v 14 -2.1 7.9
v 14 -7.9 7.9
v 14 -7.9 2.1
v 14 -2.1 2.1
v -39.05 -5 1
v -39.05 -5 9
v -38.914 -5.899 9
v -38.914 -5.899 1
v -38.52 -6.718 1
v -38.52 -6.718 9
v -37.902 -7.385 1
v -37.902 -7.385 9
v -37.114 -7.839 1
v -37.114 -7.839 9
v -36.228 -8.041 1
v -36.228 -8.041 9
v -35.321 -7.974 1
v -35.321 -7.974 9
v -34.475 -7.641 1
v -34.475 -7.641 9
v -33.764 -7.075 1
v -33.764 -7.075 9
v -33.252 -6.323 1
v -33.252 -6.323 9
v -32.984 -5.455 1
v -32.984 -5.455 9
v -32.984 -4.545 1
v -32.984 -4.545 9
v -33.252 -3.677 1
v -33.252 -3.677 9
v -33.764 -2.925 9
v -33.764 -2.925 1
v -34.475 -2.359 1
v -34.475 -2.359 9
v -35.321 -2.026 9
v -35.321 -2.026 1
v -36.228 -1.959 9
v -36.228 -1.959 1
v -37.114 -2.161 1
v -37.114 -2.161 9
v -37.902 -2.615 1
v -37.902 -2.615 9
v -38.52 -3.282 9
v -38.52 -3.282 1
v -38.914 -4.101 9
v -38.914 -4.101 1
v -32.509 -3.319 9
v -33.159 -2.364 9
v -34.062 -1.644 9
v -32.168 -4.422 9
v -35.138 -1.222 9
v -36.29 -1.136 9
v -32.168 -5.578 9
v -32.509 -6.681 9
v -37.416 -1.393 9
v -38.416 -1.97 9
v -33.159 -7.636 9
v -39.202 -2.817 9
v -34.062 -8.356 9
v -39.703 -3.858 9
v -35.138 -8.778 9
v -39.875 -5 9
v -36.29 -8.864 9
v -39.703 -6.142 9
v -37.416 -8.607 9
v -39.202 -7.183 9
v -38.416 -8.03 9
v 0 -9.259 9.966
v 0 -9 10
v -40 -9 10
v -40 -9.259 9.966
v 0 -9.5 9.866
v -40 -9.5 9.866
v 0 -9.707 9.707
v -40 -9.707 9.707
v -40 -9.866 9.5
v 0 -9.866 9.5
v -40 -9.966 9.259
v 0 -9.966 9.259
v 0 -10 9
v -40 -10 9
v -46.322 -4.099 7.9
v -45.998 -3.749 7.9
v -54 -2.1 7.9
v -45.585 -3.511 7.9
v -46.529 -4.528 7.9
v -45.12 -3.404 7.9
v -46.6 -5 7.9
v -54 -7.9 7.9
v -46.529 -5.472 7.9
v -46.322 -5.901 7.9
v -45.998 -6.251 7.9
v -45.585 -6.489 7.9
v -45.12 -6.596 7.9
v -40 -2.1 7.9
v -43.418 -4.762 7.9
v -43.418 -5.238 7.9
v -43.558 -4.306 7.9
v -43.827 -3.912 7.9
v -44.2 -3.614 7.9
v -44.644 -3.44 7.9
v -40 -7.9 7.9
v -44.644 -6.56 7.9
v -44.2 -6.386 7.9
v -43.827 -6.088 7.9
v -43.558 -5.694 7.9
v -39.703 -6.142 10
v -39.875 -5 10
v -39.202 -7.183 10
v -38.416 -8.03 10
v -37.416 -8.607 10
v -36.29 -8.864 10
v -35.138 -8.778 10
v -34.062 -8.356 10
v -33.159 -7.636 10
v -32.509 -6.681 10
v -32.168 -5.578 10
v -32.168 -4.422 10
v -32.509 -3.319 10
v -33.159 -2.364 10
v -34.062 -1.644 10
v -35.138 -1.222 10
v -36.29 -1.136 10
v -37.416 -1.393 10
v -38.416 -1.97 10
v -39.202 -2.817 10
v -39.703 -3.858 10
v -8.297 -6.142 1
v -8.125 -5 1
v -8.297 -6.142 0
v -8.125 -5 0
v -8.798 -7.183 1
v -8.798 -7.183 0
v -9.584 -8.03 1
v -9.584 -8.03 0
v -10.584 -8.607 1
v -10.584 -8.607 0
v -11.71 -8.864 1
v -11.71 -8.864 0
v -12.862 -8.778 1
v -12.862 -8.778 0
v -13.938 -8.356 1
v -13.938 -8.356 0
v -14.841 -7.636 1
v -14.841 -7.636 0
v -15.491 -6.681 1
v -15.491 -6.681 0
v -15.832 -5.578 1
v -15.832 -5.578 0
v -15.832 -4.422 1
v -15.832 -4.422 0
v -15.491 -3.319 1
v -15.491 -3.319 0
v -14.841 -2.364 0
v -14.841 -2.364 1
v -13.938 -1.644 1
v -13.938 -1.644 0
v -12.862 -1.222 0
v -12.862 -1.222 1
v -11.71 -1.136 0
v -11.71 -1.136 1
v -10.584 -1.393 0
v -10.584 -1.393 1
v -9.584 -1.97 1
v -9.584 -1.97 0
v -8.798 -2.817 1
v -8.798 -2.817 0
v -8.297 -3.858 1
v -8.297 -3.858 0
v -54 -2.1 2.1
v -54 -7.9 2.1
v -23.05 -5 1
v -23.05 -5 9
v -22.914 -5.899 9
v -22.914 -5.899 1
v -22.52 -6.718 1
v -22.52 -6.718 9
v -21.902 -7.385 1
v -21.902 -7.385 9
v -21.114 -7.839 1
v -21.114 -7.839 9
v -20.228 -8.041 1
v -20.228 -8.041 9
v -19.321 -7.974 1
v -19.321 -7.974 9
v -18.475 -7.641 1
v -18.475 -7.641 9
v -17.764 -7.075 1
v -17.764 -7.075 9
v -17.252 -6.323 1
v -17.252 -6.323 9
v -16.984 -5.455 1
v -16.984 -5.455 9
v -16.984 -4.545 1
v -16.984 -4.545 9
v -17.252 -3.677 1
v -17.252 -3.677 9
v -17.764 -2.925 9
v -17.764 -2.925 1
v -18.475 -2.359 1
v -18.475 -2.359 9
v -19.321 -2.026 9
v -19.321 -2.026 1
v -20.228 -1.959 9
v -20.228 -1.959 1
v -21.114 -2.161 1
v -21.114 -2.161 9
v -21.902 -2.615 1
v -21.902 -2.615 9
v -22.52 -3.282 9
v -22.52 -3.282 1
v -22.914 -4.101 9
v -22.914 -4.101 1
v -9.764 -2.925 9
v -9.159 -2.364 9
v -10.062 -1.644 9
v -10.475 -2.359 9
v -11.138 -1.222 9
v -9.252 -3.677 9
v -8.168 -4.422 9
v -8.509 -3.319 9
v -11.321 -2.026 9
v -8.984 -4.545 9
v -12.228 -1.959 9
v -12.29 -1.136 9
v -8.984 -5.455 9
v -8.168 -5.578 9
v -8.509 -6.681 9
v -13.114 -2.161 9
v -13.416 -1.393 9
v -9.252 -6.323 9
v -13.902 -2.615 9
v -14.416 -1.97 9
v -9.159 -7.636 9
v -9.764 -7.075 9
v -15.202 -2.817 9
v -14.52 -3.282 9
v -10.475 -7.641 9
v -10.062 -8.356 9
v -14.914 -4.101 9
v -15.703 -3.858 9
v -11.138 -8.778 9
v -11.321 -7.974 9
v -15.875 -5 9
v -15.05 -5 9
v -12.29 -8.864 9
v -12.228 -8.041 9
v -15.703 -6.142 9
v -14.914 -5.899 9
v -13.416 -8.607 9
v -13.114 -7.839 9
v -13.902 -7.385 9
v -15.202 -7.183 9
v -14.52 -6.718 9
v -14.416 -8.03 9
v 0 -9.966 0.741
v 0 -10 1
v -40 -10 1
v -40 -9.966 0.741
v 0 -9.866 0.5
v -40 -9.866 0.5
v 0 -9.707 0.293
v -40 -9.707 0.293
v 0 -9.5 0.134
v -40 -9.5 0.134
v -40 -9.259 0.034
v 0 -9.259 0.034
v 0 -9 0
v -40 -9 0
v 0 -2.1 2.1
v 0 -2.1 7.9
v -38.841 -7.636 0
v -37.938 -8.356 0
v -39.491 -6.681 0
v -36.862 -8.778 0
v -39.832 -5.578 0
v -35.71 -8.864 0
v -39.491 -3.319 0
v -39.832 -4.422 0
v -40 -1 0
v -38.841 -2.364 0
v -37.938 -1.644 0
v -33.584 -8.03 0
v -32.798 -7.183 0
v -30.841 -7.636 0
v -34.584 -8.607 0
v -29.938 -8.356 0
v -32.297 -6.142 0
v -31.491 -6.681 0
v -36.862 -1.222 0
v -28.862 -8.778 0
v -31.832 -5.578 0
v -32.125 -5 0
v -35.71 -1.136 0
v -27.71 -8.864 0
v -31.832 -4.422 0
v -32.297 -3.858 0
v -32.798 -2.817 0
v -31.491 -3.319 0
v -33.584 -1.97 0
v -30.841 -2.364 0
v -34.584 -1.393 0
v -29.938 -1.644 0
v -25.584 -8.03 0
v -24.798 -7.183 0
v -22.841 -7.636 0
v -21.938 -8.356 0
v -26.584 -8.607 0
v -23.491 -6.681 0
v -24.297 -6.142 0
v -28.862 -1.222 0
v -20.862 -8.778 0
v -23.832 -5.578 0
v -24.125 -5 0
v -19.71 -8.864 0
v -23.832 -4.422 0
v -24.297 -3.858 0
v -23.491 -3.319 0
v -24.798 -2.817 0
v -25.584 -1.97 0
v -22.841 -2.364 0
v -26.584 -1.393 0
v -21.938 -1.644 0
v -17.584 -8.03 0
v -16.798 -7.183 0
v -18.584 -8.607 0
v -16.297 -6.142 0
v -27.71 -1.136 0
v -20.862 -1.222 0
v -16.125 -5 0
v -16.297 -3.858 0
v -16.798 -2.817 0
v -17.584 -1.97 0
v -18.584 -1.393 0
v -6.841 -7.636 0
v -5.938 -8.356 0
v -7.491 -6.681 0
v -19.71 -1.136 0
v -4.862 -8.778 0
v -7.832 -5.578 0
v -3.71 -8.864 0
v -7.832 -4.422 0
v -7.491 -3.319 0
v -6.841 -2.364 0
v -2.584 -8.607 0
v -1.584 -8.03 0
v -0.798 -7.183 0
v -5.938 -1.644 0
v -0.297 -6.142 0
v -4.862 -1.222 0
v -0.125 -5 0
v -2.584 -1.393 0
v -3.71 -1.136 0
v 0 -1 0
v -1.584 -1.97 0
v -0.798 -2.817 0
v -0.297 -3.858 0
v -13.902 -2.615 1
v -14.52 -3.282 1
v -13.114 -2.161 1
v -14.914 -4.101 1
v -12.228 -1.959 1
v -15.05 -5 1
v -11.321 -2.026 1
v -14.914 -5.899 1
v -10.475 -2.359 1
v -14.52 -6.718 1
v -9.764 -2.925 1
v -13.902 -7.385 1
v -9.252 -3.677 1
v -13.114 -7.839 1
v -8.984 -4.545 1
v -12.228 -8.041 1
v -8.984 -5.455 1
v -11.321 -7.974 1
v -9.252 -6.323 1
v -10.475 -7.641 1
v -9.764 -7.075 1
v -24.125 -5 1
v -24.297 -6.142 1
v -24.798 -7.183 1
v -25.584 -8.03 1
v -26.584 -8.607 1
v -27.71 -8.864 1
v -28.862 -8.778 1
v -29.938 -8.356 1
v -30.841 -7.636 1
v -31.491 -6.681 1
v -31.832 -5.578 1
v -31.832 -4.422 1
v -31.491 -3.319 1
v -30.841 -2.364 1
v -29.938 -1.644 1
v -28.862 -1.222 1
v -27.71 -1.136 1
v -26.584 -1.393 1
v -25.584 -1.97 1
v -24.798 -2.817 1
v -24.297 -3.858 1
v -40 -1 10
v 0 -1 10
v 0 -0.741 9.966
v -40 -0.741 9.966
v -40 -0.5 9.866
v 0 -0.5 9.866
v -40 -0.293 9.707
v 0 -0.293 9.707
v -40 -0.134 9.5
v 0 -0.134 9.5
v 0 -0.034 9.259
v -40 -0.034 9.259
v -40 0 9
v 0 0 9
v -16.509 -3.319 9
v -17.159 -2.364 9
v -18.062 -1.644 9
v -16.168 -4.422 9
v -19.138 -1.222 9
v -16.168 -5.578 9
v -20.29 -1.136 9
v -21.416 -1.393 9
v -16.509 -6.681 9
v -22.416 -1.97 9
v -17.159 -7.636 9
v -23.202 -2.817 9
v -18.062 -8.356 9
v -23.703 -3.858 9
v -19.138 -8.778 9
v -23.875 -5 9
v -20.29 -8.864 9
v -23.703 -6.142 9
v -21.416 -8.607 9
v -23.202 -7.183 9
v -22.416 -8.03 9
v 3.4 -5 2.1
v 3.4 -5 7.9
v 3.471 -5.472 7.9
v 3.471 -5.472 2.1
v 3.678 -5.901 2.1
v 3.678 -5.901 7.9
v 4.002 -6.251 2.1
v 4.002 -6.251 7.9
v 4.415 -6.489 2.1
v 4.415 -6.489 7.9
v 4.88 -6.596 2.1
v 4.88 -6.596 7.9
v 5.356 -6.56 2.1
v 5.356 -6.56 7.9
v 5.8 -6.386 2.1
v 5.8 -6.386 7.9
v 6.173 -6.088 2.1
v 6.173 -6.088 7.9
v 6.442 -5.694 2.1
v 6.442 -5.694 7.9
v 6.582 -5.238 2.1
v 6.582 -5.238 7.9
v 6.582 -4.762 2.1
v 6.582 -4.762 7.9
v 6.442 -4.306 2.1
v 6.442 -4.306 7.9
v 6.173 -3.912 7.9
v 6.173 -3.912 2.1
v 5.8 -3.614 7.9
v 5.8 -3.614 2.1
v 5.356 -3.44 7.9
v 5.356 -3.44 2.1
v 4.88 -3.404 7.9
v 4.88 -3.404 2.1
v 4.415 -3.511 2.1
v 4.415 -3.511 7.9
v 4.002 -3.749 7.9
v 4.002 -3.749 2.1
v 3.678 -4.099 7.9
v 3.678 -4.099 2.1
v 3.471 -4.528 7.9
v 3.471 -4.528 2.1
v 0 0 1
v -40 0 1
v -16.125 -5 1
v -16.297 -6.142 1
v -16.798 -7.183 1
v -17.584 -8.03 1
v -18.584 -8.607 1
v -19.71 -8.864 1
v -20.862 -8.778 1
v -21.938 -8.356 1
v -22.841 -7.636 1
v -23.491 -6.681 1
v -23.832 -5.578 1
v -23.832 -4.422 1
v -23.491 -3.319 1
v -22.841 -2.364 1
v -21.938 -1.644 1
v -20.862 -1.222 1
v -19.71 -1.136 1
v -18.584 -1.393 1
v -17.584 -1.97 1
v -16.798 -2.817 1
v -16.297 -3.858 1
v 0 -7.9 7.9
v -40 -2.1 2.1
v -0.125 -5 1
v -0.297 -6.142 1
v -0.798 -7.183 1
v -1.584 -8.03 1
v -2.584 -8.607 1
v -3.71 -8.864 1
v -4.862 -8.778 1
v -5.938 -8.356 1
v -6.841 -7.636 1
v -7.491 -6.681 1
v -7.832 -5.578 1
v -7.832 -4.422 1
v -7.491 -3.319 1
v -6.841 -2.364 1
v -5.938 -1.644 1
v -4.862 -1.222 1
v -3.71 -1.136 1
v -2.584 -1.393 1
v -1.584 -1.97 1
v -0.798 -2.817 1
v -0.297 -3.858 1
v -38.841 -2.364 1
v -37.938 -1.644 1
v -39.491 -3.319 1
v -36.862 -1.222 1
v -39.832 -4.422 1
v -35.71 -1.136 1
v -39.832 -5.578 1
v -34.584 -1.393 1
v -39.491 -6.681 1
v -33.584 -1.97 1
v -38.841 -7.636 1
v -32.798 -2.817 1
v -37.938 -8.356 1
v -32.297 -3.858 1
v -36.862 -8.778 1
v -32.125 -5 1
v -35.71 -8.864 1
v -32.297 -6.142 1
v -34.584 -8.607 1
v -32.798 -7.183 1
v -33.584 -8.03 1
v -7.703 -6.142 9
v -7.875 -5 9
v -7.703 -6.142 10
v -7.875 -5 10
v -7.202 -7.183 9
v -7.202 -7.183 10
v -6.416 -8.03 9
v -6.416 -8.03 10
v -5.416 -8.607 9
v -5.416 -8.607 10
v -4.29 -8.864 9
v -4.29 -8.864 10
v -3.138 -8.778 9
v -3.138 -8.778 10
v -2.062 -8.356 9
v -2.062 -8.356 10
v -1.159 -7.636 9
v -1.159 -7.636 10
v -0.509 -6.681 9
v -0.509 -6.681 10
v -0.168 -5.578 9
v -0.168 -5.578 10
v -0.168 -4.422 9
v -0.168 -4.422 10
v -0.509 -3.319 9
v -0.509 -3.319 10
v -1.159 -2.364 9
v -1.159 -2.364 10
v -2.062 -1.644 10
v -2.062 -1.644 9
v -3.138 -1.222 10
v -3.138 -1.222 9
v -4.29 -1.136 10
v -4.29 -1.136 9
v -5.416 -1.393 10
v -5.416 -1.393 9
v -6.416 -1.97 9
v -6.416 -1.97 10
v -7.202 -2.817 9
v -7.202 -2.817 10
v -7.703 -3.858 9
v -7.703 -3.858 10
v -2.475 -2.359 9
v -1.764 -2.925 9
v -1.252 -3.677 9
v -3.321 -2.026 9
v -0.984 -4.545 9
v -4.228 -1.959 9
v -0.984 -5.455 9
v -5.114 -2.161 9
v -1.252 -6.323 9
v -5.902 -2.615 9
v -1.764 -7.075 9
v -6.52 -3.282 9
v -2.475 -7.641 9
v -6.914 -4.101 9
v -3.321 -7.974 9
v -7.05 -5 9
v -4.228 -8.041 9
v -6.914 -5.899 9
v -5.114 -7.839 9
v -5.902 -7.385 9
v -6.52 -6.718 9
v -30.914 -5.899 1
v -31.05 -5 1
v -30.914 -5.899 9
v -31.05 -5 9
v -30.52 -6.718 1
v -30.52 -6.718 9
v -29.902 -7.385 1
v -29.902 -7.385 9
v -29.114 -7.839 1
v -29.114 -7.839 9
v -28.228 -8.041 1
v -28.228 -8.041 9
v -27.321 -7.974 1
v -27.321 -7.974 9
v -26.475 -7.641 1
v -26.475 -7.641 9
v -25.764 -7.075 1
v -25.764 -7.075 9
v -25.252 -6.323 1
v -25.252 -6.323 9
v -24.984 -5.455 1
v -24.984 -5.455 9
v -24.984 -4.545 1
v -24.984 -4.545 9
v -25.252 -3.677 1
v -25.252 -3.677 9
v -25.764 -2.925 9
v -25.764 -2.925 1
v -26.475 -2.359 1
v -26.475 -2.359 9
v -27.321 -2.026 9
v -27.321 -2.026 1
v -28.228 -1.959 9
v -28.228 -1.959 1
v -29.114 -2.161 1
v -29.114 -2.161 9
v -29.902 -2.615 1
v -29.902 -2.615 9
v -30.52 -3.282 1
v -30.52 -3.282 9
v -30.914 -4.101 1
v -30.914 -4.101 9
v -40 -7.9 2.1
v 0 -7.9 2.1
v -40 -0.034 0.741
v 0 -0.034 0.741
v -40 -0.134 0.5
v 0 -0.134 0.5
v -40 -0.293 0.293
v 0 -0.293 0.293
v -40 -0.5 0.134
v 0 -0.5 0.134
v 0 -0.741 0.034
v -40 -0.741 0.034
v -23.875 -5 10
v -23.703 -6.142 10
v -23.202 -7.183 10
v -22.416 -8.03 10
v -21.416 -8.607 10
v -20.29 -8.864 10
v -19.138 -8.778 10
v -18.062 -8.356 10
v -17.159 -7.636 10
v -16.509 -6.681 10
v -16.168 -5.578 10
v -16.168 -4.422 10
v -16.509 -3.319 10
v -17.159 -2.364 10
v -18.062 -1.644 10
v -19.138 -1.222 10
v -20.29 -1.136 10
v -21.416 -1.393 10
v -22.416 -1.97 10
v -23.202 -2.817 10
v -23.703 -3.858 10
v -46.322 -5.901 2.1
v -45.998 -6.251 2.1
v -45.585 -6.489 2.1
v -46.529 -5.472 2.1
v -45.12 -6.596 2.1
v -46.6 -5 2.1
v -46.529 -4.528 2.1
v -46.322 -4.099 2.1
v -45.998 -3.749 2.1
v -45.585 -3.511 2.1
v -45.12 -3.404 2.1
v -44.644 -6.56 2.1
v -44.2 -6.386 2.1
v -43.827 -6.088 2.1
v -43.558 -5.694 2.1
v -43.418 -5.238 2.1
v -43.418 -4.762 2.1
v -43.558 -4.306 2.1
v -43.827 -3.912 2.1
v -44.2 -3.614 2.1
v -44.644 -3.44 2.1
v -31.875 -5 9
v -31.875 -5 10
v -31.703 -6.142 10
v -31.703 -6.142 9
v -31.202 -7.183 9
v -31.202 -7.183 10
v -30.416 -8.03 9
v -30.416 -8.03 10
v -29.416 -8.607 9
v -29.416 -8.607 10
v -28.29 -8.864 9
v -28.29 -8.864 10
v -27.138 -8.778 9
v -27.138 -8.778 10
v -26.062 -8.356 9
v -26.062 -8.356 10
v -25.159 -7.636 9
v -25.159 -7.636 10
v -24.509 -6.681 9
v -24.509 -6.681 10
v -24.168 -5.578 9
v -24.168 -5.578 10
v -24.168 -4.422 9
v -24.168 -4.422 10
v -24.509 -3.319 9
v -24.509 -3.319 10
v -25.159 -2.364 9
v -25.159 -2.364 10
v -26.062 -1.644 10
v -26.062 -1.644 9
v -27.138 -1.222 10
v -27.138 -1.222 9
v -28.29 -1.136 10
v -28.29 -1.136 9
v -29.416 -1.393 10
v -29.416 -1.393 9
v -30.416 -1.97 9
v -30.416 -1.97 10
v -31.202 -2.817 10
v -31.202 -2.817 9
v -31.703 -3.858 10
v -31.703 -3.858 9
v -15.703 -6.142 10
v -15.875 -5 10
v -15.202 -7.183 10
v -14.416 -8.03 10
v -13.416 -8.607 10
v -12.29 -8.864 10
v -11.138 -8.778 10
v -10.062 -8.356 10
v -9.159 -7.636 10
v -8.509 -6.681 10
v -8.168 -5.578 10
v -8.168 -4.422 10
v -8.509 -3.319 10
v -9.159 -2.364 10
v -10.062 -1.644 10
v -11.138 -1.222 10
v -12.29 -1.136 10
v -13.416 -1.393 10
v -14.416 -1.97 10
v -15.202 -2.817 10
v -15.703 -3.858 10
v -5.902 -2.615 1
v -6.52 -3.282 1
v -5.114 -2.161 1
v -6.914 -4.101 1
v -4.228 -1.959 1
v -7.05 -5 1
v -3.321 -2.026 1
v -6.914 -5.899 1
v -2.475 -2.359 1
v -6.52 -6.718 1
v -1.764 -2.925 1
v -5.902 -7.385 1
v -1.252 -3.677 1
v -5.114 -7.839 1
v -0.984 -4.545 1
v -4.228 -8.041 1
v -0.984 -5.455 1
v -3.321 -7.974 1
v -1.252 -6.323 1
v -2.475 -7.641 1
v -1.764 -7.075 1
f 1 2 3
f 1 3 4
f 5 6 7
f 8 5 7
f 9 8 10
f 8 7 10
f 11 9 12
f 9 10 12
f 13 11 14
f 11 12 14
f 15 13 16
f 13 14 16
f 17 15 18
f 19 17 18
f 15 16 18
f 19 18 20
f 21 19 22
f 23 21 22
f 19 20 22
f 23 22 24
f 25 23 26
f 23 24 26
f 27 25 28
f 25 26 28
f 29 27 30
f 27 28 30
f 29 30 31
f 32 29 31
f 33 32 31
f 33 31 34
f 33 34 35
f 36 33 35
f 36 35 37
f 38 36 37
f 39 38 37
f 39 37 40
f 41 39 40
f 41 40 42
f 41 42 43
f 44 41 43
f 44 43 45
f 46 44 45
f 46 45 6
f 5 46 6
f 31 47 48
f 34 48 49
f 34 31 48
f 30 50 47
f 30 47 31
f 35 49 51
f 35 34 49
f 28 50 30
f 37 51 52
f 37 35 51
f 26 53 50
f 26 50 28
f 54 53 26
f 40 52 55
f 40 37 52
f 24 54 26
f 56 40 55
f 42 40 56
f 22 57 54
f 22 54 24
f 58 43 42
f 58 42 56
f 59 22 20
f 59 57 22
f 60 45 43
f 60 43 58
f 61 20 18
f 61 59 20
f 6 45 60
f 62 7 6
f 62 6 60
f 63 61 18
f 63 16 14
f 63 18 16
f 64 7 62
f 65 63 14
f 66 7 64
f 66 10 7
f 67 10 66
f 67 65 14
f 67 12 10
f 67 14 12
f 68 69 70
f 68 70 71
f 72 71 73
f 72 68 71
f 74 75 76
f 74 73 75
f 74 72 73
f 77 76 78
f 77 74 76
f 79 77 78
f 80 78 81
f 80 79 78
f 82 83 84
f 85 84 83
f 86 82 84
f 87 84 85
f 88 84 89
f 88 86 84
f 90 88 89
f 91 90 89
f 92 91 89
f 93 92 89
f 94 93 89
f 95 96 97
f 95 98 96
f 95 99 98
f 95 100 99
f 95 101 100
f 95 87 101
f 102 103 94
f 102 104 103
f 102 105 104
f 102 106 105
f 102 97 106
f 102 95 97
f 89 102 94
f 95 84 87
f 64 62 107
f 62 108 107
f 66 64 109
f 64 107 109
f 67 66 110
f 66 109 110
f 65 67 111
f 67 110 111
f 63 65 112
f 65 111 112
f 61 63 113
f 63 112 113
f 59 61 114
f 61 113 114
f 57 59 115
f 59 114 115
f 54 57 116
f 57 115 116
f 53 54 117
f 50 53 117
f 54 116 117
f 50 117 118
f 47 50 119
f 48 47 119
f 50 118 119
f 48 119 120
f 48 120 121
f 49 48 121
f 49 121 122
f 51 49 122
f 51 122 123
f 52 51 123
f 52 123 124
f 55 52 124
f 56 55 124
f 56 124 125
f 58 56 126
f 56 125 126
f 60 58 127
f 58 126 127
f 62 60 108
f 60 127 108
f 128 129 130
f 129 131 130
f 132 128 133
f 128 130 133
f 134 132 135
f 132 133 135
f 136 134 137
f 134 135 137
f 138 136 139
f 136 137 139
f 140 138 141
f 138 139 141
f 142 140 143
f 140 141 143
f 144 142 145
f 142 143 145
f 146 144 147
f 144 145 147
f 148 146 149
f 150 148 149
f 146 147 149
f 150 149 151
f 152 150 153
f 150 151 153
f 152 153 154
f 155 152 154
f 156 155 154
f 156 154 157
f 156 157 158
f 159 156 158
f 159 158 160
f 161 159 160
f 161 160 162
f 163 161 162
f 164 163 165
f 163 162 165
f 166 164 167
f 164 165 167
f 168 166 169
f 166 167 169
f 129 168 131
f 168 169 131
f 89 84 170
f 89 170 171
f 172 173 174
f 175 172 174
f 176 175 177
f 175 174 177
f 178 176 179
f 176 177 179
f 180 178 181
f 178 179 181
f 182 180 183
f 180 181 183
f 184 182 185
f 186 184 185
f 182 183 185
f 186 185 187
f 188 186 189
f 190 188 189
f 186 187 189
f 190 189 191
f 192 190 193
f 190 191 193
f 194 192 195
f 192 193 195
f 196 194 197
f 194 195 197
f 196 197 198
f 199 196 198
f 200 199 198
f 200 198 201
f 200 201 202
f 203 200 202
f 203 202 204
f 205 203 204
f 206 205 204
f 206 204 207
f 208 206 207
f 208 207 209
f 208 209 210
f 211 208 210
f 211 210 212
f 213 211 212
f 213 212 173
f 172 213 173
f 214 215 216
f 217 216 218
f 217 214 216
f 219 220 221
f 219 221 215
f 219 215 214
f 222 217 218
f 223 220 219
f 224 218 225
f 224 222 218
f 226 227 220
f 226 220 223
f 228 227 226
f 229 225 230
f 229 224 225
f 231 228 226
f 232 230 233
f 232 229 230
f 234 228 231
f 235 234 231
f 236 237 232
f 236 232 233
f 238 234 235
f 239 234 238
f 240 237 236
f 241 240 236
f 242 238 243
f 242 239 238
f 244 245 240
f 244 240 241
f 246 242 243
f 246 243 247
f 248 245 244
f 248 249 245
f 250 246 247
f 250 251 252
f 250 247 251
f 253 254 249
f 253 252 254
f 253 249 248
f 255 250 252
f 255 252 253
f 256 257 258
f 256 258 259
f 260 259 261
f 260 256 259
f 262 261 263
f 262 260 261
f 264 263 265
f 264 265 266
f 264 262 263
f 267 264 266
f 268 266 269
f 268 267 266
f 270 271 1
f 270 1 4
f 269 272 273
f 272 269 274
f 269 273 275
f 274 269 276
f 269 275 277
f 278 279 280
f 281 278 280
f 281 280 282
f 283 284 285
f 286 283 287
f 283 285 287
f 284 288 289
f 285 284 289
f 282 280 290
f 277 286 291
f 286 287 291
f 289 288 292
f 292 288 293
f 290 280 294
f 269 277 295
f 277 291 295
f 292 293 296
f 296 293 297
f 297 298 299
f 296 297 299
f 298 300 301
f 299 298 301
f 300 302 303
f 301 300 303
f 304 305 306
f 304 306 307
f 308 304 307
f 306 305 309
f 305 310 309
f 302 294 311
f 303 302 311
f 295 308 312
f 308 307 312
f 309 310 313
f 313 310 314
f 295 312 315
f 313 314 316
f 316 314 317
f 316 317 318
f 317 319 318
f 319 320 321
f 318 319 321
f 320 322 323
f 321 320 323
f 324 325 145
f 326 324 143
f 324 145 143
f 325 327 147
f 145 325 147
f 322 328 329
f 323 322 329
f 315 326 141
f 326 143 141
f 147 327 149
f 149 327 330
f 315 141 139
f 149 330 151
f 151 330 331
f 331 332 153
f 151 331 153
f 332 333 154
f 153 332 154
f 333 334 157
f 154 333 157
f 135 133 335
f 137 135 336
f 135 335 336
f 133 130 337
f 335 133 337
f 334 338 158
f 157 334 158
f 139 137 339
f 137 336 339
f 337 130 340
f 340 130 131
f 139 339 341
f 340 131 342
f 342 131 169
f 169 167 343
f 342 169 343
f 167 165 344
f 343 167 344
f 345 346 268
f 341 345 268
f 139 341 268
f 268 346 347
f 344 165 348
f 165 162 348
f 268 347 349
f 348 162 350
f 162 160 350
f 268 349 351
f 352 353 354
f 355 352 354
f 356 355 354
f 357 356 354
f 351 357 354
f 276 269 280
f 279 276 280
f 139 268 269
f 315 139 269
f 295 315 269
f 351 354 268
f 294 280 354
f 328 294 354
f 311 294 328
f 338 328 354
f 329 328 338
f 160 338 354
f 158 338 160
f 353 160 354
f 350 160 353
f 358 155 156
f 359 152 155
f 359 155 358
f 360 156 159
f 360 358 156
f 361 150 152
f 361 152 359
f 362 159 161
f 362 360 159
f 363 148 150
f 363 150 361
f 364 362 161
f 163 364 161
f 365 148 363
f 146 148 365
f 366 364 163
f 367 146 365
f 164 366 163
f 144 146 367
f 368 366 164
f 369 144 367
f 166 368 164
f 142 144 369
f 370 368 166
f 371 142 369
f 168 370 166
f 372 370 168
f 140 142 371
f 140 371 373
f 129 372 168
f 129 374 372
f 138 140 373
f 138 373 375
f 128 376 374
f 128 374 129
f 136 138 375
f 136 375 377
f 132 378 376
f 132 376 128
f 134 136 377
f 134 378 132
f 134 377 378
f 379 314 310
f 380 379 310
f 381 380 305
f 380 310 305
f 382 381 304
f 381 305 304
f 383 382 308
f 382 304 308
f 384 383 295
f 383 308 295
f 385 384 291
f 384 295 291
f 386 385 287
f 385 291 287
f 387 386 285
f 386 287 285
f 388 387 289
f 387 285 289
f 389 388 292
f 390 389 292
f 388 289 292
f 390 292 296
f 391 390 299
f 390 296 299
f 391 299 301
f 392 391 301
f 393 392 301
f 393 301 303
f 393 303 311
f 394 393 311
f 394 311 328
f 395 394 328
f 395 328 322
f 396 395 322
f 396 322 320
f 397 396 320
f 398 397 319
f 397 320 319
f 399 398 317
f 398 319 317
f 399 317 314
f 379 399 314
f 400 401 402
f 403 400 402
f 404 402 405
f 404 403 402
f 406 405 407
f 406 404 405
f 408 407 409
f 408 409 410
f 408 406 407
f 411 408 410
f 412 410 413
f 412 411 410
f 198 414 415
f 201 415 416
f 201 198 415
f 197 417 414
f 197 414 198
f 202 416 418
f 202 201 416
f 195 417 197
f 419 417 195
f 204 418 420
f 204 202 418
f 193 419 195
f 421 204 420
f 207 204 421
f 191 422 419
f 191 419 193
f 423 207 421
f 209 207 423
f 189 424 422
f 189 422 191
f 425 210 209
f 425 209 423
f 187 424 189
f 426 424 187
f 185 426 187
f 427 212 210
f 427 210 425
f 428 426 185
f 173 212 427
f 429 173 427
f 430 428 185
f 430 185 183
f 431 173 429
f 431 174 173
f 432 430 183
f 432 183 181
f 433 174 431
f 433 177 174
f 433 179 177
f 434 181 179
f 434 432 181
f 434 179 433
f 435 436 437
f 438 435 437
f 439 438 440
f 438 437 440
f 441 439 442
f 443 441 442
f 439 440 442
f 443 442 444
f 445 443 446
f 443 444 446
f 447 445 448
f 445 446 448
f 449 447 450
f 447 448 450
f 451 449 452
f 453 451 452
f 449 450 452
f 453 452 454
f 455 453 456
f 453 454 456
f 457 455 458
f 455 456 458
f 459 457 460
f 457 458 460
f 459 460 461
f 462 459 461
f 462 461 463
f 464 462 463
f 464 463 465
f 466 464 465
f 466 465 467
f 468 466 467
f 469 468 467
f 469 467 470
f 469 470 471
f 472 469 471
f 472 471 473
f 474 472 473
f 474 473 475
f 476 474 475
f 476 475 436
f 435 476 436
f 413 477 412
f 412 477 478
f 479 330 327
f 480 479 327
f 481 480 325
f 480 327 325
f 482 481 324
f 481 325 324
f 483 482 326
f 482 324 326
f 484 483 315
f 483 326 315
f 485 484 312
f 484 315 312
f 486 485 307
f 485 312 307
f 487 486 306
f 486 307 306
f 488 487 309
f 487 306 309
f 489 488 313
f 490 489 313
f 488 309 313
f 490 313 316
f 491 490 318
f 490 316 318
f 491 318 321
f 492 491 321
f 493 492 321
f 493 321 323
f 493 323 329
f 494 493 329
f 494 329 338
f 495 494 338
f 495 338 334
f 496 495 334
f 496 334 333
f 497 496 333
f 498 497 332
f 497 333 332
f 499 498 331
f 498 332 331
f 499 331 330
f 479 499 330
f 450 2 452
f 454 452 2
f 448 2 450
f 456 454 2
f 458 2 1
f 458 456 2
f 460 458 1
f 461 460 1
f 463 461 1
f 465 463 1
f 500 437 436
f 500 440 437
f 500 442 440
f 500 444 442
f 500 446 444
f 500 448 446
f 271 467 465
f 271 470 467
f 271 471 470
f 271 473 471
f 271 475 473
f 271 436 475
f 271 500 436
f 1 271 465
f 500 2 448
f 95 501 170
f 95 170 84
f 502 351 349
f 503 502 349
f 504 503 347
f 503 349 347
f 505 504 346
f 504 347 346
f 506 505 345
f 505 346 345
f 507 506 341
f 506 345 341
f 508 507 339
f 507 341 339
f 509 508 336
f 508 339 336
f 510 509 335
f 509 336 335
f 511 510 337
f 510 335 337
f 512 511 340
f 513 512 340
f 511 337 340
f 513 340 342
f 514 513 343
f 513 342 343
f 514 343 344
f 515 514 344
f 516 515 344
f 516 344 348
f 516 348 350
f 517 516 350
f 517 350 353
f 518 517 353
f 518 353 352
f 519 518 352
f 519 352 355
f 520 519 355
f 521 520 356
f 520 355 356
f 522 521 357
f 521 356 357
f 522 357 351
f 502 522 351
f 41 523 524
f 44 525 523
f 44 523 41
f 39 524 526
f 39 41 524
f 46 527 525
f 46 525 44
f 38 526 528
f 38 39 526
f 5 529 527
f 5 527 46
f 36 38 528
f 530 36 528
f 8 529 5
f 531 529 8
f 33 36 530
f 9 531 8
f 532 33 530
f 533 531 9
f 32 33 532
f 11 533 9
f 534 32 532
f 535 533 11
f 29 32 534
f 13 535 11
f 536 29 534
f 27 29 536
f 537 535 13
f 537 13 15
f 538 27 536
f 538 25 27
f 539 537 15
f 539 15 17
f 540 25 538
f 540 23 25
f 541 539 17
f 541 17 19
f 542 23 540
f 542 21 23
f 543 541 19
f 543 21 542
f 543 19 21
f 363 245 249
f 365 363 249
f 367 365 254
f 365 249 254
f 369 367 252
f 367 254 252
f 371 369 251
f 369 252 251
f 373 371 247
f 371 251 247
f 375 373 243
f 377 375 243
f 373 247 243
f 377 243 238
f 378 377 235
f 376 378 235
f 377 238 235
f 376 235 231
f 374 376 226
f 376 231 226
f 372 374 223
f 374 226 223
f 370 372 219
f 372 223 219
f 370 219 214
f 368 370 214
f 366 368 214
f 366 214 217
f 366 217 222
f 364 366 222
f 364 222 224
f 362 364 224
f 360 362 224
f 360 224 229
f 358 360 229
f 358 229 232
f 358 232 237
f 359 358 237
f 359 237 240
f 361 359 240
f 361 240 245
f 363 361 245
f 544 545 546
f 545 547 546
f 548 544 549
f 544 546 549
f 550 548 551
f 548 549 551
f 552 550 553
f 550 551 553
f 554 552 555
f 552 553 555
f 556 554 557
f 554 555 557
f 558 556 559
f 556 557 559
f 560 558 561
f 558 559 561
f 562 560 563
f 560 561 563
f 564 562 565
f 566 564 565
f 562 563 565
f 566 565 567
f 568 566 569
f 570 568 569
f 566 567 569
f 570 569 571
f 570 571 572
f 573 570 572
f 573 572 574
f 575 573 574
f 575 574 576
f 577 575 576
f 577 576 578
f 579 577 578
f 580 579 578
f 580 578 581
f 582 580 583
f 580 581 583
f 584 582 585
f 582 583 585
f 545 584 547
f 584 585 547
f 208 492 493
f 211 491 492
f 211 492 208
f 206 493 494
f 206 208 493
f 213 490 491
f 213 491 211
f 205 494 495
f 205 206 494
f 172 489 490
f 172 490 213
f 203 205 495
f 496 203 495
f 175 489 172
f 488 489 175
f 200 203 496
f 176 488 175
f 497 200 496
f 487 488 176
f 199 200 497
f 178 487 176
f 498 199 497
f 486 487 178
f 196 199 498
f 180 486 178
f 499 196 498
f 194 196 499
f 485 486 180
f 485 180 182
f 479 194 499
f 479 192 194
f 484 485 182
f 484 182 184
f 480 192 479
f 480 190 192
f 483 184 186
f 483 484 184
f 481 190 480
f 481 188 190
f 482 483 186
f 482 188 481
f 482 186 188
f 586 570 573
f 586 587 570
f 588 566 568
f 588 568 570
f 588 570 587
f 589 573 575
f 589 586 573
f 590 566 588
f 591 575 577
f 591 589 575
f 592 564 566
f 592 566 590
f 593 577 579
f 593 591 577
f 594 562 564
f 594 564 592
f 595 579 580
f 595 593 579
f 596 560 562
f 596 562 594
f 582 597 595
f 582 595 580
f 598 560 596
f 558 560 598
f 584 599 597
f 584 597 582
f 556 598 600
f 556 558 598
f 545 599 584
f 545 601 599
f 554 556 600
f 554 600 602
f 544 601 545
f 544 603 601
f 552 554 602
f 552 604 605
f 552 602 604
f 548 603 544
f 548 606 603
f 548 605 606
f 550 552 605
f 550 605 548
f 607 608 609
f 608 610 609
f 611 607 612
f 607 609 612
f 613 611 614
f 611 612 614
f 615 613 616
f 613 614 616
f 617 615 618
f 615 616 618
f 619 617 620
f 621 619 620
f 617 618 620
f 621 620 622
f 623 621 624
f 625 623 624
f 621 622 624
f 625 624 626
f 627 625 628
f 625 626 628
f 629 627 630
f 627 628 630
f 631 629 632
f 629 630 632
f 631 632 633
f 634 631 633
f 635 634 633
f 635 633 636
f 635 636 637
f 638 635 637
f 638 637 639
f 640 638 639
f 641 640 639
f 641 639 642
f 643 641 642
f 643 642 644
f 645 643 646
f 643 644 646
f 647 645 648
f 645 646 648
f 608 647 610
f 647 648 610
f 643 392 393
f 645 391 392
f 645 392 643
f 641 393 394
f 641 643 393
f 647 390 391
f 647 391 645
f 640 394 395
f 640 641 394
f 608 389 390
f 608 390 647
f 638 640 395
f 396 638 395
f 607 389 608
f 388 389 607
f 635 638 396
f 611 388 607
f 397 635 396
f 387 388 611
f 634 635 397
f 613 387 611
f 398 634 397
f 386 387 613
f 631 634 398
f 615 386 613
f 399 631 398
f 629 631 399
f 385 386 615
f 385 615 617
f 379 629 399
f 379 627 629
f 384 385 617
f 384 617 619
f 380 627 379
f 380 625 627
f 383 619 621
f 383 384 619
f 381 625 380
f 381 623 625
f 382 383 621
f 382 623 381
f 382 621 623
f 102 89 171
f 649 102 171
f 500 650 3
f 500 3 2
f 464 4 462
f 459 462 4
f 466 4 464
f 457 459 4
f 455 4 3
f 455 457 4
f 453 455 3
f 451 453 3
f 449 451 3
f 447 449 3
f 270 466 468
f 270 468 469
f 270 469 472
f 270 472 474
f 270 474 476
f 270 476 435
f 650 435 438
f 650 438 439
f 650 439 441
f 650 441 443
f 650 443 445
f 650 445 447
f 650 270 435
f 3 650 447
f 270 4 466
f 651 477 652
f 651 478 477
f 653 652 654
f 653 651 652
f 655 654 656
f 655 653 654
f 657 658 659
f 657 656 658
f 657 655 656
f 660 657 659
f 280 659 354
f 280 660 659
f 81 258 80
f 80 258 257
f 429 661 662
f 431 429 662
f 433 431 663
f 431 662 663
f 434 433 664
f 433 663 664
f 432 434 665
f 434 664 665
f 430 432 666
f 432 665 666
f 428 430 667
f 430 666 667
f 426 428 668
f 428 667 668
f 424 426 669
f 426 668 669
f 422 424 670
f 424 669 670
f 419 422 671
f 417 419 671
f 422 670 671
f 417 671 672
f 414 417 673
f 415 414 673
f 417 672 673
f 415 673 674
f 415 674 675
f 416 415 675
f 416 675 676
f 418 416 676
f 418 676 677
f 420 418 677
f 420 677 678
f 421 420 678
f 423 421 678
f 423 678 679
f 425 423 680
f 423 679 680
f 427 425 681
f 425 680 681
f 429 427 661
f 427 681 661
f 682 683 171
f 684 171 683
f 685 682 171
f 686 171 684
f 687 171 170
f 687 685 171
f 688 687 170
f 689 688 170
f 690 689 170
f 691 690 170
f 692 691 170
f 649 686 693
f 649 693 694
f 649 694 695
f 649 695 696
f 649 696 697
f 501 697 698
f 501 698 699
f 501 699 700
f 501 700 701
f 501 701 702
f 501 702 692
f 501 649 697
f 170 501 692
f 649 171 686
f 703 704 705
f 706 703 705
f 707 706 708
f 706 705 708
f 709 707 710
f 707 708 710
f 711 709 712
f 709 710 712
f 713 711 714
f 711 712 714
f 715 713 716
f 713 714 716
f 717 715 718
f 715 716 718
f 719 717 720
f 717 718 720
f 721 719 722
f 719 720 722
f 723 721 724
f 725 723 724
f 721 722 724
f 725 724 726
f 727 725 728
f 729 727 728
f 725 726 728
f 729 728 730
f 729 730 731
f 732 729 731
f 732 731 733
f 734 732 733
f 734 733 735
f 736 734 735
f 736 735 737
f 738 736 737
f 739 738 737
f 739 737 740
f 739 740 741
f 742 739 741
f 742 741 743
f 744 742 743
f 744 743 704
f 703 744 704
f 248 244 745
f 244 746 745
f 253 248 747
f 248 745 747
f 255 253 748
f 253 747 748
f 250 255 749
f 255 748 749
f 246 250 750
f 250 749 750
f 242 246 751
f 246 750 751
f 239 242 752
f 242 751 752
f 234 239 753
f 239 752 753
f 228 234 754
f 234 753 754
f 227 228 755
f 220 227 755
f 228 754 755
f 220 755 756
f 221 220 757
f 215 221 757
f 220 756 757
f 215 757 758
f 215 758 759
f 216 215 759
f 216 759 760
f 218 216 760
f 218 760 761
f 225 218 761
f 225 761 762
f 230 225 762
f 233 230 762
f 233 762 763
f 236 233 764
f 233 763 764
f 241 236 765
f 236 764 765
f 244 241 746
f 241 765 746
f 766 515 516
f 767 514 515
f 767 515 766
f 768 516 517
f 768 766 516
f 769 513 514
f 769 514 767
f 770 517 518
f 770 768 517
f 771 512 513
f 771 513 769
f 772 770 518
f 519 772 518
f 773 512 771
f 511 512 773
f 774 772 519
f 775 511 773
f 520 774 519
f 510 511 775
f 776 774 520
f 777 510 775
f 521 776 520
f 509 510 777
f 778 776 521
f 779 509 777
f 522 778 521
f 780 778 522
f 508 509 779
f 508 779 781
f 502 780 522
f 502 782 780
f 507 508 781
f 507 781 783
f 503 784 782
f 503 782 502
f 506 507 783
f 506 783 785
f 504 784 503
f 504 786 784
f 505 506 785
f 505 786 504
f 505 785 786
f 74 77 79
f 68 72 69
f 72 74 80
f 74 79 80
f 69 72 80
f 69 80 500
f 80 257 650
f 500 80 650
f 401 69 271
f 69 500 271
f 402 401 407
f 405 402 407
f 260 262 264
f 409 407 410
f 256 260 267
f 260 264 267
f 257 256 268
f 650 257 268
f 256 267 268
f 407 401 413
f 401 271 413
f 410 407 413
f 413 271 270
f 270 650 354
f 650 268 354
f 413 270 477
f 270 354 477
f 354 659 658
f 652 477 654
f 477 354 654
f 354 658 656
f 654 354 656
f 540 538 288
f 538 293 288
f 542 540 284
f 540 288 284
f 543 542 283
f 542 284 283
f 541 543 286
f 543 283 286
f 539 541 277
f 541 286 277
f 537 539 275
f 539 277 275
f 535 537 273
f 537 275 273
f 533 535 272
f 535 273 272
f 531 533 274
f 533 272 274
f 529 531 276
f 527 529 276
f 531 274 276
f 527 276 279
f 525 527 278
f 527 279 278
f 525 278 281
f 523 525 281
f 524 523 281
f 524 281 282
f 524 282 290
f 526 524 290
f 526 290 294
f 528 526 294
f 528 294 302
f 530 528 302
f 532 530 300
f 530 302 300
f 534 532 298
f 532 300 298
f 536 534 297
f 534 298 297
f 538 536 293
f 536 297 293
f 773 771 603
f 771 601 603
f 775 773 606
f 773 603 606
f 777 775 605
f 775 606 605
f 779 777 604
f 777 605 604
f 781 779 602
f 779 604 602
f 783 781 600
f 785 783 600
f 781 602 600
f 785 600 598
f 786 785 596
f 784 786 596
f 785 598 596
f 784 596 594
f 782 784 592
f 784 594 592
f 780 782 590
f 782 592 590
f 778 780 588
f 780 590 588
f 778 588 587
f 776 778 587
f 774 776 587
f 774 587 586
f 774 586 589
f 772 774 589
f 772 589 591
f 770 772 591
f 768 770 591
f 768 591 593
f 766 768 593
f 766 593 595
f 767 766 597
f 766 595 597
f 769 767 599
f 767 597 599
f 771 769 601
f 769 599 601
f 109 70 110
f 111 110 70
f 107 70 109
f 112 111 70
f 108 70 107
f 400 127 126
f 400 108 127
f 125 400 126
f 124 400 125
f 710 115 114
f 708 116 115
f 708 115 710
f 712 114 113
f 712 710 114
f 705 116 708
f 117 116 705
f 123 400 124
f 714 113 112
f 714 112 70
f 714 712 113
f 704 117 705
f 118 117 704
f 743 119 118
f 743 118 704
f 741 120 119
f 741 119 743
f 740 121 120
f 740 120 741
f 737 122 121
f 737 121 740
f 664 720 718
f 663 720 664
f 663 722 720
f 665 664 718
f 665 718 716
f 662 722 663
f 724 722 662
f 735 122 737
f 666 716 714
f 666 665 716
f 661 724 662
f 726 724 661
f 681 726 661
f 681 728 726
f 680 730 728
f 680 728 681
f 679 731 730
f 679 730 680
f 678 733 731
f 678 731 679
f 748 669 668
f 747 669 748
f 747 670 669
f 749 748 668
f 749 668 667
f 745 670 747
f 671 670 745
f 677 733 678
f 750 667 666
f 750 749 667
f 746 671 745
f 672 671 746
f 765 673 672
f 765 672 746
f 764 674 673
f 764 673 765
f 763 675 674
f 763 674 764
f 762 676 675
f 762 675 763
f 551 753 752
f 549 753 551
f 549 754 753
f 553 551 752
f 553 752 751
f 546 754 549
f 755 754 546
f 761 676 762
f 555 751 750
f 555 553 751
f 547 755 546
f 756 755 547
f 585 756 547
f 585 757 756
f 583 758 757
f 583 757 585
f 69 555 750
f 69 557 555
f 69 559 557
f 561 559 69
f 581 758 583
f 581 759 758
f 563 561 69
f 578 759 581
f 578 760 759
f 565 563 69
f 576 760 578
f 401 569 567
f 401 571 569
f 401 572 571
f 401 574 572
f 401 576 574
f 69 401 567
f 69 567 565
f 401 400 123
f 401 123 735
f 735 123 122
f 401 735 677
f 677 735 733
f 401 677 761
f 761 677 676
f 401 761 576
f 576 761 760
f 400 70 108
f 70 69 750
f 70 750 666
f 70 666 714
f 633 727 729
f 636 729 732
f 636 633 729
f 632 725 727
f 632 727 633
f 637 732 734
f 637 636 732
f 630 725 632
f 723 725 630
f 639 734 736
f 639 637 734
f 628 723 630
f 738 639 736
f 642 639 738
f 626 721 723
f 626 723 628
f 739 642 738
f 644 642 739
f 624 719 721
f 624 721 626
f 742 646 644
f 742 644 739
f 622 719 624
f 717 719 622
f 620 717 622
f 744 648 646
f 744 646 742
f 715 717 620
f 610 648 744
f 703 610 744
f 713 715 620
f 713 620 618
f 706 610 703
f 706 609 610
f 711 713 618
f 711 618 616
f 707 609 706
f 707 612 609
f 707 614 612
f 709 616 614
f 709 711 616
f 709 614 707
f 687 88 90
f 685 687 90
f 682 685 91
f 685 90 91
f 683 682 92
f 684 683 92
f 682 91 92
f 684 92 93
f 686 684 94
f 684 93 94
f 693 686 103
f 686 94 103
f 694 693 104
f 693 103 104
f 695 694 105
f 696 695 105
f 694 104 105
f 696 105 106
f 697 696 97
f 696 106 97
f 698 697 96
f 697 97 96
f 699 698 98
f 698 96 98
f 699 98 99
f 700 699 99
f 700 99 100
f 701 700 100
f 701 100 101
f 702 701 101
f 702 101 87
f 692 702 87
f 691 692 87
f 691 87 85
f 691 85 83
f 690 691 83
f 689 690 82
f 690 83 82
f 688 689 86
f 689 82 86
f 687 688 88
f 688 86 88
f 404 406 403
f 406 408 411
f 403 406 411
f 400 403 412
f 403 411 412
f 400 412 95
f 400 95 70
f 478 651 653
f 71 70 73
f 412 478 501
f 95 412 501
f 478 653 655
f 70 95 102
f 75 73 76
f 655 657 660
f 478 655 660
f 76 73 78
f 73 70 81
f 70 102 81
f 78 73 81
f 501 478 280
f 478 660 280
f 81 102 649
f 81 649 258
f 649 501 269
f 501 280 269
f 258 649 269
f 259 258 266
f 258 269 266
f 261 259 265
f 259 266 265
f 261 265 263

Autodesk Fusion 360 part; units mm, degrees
sketch "Sketch1" plane through (0, 0, 0) normal (0, 0, 1) x (1, 0, 0)
  line L0 (0, 0) -> (-40, 0)
  line L1 (-40, 0) -> (-40, -10)
  line L2 (-40, -10) -> (0, -10)
  line L3 (0, -10) -> (0, 0)
  dimension "SideLenght" = 40
  dimension "SideWidth" = 10
extrude "Extrude5" add sketch "Sketch1" along normal blind 10
sketch "Sketch5" plane through (0, 0, 0) normal (1, 0, 0) x (0, 1, 0)
  line L0 (-10, 0) -> (0, 0)
  line L1 (0, 0) -> (0, 10)
  line L2 (0, 10) -> (-10, 10)
  line L3 (-10, 10) -> (-10, 0)
  line L4 (-10, 10) -> (-7.9, 10) construction
  line L5 (-7.9, 10) -> (-7.9, 7.9) construction
  line L6 (0, 0) -> (-2.1, 0) construction
  line L7 (-2.1, 0) -> (-2.1, 2.1) construction
  line L8 (-7.9, 7.9) -> (-2.1, 7.9)
  line L9 (-2.1, 7.9) -> (-2.1, 2.1)
  line L10 (-2.1, 2.1) -> (-7.9, 2.1)
  line L11 (-7.9, 2.1) -> (-7.9, 7.9)
  dimension "PegOffset" = 2.1
  dimension "d15" = 2.1
  dimension "d16" = 2.1
  dimension "d17" = 2.1
sketch "Sketch6" plane through (-40, 0, 0) normal (-1, 0, 0) x (0, -1, 0)
  line L0 (0, 0) -> (10, 0)
  line L1 (10, 0) -> (10, 10)
  line L2 (10, 10) -> (0, 10)
  line L3 (0, 10) -> (0, 0)
  line L4 (0, 10) -> (2.1, 10) construction
  line L5 (2.1, 10) -> (2.1, 7.9) construction
  line L6 (10, 0) -> (7.9, 0) construction
  line L7 (7.9, 0) -> (7.9, 2.1) construction
  line L8 (2.1, 7.9) -> (7.9, 7.9)
  line L9 (7.9, 7.9) -> (7.9, 2.1)
  line L10 (7.9, 2.1) -> (2.1, 2.1)
  line L11 (2.1, 2.1) -> (2.1, 7.9)
  dimension "d18" = 2.1
  dimension "d19" = 2.1
  dimension "d20" = 2.1
  dimension "d21" = 2.1
extrude "Extrude6" add sketch "Sketch6" along normal blind 14 contours L8 L9 L10 L11
extrude "Extrude7" add sketch "Sketch5" along normal blind 14 contours L8 L9 L10 L11
sketch "Sketch7" plane through (0, 0, 7.9) normal (0, 0, 1) x (-1, 0, 0)
  line L0 (40, 7.9) -> (40, 2.1)
  line L1 (40, 2.1) -> (54, 2.1)
  line L2 (54, 2.1) -> (54, 7.9)
  line L3 (54, 7.9) -> (40, 7.9)
  line L4 (40, 5) -> (54, 5) construction
  line L5 (40, 5) -> (50, 5) construction
  circle A0 centre (45, 5) radius 1.6
  dimension "d31" = 3.2
  dimension "d33" = 10
sketch "Sketch8" plane through (0, 0, 7.9) normal (0, 0, 1) x (-1, 0, 0)
  line L0 (0, 2.1) -> (0, 7.9)
  line L1 (0, 7.9) -> (-14, 7.9)
  line L2 (-14, 7.9) -> (-14, 2.1)
  line L3 (-14, 2.1) -> (0, 2.1)
  line L4 (0, 5) -> (-14, 5) construction
  line L5 (-10, 5) -> (0, 5) construction
  circle A0 centre (-5, 5) radius 1.6
  dimension "d32" = 3.2
  dimension "d34" = 10
extrude "Extrude8" cut sketch "Sketch8" sketch "Sketch7" against normal blind 11 contours A0 of sketch 2 contours A0
fillet "Fillet1" radius 1 1 edges at (-20, 0, 0)
fillet "Fillet1" radius 1 3 edges at (-20, 0, 10) (-20, -10, 10) (-20, -10, 0)
sketch "Sketch9" plane through (0, 0, 10) normal (0, 0, 1) x (-1, 0, 0)
  line L0 (40, 9) -> (0, 9)
  line L1 (0, 9) -> (0, 1)
  line L2 (0, 1) -> (40, 1)
  line L3 (40, 1) -> (40, 9)
  line L4 (20, 1) -> (20, 9) construction
  line L5 (20, 9) -> (40, 9) construction
  line L6 (10, 1) -> (0, 1)
  circle A0 centre (4, 5) radius 4 construction
  line L7 (40, 5) -> (0, 5) construction
  circle A1 centre (12, 5) radius 4 construction
  circle A2 centre (20, 5) radius 4 construction
  circle A3 centre (28, 5) radius 4 construction
  circle A4 centre (4, 5) radius 3.05
  circle A5 centre (12, 5) radius 3.05
  circle A6 centre (36, 5) radius 4 construction
  circle A7 centre (20, 5) radius 3.05
  circle A8 centre (28, 5) radius 3.05
  circle A9 centre (36, 5) radius 3.05
  circle A10 centre (28, 5) radius 3.875
  circle A11 centre (36, 5) radius 3.875
  circle A12 centre (20, 5) radius 3.875
  circle A13 centre (12, 5) radius 3.875
  circle A14 centre (4, 5) radius 3.875
  dimension "d43" = 8
  dimension "d44" = 8
  dimension "d45" = 8
  dimension "d46" = 8
  dimension "d47" = 6.1
  dimension "d48" = 6.1
  dimension "d49" = 8
  dimension "d50" = 6.1
  dimension "d51" = 6.1
  dimension "d52" = 6.1
  dimension "d55" = 7.75
  dimension "d57" = 7.75
  dimension "d58" = 7.75
  dimension "d59" = 7.75
  dimension "d60" = 7.75
extrude "Extrude9" cut sketch "Sketch9" against normal blind 19 contours A4 | A5 | A7 | A8 | A9
extrude "Extrude10" cut sketch "Sketch9" against normal blind 1 contours A10 | A11 | A12 | A13 | A14
sketch "Sketch10" plane through (0, 0, 0) normal (0, 0, -1) x (1, 0, 0)
  circle A0 centre (-20, 5) radius 3.05
  circle A1 centre (-28, 5) radius 3.05
  circle A2 centre (-4, 5) radius 3.05
  circle A3 centre (-36, 5) radius 3.05
  circle A4 centre (-12, 5) radius 3.05
  line L0 (0, 9) -> (-40, 9)
  line L1 (-40, 9) -> (-40, 1)
  line L2 (-40, 1) -> (0, 1)
  line L3 (0, 1) -> (0, 9)
  circle A5 centre (-4, 5) radius 3.875
  circle A6 centre (-12, 5) radius 3.875
  circle A7 centre (-20, 5) radius 3.875
  circle A8 centre (-28, 5) radius 3.875
  circle A9 centre (-36, 5) radius 3.875
  dimension "d63" = 7.75
  dimension "d64" = 7.75
  dimension "d65" = 7.75
  dimension "d66" = 7.75
  dimension "d67" = 7.75
extrude "Extrude11" cut sketch "Sketch10" against normal blind 1 contours A5 | A6 | A7 | A8 | A9
equation "d12 = SideWidth"
equation "d15 = PegOffset"
equation "d16 = PegOffset"
equation "d17 = PegOffset"
equation "d18 = PegOffset"
equation "d19 = PegOffset"
equation "d20 = PegOffset"
equation "d21 = PegOffset"
equation "PegLenght = 14 mm"
equation "d24 = PegLenght"
equation "PinHole = 6.1 mm"
equation "d47 = PinHole"
equation "d48 = PinHole"
equation "d50 = PinHole"
equation "d51 = PinHole"
equation "d52 = PinHole"
equation "d55 = PinHoleExt"
equation "PinHoleExt = 7.75 mm"
equation "d57 = PinHoleExt"
equation "d58 = PinHoleExt"
equation "d59 = PinHoleExt"
equation "d60 = PinHoleExt"
equation "d63 = PinHoleExt"
equation "d64 = PinHoleExt"
equation "d65 = PinHoleExt"
equation "d66 = PinHoleExt"
equation "d67 = PinHoleExt"
